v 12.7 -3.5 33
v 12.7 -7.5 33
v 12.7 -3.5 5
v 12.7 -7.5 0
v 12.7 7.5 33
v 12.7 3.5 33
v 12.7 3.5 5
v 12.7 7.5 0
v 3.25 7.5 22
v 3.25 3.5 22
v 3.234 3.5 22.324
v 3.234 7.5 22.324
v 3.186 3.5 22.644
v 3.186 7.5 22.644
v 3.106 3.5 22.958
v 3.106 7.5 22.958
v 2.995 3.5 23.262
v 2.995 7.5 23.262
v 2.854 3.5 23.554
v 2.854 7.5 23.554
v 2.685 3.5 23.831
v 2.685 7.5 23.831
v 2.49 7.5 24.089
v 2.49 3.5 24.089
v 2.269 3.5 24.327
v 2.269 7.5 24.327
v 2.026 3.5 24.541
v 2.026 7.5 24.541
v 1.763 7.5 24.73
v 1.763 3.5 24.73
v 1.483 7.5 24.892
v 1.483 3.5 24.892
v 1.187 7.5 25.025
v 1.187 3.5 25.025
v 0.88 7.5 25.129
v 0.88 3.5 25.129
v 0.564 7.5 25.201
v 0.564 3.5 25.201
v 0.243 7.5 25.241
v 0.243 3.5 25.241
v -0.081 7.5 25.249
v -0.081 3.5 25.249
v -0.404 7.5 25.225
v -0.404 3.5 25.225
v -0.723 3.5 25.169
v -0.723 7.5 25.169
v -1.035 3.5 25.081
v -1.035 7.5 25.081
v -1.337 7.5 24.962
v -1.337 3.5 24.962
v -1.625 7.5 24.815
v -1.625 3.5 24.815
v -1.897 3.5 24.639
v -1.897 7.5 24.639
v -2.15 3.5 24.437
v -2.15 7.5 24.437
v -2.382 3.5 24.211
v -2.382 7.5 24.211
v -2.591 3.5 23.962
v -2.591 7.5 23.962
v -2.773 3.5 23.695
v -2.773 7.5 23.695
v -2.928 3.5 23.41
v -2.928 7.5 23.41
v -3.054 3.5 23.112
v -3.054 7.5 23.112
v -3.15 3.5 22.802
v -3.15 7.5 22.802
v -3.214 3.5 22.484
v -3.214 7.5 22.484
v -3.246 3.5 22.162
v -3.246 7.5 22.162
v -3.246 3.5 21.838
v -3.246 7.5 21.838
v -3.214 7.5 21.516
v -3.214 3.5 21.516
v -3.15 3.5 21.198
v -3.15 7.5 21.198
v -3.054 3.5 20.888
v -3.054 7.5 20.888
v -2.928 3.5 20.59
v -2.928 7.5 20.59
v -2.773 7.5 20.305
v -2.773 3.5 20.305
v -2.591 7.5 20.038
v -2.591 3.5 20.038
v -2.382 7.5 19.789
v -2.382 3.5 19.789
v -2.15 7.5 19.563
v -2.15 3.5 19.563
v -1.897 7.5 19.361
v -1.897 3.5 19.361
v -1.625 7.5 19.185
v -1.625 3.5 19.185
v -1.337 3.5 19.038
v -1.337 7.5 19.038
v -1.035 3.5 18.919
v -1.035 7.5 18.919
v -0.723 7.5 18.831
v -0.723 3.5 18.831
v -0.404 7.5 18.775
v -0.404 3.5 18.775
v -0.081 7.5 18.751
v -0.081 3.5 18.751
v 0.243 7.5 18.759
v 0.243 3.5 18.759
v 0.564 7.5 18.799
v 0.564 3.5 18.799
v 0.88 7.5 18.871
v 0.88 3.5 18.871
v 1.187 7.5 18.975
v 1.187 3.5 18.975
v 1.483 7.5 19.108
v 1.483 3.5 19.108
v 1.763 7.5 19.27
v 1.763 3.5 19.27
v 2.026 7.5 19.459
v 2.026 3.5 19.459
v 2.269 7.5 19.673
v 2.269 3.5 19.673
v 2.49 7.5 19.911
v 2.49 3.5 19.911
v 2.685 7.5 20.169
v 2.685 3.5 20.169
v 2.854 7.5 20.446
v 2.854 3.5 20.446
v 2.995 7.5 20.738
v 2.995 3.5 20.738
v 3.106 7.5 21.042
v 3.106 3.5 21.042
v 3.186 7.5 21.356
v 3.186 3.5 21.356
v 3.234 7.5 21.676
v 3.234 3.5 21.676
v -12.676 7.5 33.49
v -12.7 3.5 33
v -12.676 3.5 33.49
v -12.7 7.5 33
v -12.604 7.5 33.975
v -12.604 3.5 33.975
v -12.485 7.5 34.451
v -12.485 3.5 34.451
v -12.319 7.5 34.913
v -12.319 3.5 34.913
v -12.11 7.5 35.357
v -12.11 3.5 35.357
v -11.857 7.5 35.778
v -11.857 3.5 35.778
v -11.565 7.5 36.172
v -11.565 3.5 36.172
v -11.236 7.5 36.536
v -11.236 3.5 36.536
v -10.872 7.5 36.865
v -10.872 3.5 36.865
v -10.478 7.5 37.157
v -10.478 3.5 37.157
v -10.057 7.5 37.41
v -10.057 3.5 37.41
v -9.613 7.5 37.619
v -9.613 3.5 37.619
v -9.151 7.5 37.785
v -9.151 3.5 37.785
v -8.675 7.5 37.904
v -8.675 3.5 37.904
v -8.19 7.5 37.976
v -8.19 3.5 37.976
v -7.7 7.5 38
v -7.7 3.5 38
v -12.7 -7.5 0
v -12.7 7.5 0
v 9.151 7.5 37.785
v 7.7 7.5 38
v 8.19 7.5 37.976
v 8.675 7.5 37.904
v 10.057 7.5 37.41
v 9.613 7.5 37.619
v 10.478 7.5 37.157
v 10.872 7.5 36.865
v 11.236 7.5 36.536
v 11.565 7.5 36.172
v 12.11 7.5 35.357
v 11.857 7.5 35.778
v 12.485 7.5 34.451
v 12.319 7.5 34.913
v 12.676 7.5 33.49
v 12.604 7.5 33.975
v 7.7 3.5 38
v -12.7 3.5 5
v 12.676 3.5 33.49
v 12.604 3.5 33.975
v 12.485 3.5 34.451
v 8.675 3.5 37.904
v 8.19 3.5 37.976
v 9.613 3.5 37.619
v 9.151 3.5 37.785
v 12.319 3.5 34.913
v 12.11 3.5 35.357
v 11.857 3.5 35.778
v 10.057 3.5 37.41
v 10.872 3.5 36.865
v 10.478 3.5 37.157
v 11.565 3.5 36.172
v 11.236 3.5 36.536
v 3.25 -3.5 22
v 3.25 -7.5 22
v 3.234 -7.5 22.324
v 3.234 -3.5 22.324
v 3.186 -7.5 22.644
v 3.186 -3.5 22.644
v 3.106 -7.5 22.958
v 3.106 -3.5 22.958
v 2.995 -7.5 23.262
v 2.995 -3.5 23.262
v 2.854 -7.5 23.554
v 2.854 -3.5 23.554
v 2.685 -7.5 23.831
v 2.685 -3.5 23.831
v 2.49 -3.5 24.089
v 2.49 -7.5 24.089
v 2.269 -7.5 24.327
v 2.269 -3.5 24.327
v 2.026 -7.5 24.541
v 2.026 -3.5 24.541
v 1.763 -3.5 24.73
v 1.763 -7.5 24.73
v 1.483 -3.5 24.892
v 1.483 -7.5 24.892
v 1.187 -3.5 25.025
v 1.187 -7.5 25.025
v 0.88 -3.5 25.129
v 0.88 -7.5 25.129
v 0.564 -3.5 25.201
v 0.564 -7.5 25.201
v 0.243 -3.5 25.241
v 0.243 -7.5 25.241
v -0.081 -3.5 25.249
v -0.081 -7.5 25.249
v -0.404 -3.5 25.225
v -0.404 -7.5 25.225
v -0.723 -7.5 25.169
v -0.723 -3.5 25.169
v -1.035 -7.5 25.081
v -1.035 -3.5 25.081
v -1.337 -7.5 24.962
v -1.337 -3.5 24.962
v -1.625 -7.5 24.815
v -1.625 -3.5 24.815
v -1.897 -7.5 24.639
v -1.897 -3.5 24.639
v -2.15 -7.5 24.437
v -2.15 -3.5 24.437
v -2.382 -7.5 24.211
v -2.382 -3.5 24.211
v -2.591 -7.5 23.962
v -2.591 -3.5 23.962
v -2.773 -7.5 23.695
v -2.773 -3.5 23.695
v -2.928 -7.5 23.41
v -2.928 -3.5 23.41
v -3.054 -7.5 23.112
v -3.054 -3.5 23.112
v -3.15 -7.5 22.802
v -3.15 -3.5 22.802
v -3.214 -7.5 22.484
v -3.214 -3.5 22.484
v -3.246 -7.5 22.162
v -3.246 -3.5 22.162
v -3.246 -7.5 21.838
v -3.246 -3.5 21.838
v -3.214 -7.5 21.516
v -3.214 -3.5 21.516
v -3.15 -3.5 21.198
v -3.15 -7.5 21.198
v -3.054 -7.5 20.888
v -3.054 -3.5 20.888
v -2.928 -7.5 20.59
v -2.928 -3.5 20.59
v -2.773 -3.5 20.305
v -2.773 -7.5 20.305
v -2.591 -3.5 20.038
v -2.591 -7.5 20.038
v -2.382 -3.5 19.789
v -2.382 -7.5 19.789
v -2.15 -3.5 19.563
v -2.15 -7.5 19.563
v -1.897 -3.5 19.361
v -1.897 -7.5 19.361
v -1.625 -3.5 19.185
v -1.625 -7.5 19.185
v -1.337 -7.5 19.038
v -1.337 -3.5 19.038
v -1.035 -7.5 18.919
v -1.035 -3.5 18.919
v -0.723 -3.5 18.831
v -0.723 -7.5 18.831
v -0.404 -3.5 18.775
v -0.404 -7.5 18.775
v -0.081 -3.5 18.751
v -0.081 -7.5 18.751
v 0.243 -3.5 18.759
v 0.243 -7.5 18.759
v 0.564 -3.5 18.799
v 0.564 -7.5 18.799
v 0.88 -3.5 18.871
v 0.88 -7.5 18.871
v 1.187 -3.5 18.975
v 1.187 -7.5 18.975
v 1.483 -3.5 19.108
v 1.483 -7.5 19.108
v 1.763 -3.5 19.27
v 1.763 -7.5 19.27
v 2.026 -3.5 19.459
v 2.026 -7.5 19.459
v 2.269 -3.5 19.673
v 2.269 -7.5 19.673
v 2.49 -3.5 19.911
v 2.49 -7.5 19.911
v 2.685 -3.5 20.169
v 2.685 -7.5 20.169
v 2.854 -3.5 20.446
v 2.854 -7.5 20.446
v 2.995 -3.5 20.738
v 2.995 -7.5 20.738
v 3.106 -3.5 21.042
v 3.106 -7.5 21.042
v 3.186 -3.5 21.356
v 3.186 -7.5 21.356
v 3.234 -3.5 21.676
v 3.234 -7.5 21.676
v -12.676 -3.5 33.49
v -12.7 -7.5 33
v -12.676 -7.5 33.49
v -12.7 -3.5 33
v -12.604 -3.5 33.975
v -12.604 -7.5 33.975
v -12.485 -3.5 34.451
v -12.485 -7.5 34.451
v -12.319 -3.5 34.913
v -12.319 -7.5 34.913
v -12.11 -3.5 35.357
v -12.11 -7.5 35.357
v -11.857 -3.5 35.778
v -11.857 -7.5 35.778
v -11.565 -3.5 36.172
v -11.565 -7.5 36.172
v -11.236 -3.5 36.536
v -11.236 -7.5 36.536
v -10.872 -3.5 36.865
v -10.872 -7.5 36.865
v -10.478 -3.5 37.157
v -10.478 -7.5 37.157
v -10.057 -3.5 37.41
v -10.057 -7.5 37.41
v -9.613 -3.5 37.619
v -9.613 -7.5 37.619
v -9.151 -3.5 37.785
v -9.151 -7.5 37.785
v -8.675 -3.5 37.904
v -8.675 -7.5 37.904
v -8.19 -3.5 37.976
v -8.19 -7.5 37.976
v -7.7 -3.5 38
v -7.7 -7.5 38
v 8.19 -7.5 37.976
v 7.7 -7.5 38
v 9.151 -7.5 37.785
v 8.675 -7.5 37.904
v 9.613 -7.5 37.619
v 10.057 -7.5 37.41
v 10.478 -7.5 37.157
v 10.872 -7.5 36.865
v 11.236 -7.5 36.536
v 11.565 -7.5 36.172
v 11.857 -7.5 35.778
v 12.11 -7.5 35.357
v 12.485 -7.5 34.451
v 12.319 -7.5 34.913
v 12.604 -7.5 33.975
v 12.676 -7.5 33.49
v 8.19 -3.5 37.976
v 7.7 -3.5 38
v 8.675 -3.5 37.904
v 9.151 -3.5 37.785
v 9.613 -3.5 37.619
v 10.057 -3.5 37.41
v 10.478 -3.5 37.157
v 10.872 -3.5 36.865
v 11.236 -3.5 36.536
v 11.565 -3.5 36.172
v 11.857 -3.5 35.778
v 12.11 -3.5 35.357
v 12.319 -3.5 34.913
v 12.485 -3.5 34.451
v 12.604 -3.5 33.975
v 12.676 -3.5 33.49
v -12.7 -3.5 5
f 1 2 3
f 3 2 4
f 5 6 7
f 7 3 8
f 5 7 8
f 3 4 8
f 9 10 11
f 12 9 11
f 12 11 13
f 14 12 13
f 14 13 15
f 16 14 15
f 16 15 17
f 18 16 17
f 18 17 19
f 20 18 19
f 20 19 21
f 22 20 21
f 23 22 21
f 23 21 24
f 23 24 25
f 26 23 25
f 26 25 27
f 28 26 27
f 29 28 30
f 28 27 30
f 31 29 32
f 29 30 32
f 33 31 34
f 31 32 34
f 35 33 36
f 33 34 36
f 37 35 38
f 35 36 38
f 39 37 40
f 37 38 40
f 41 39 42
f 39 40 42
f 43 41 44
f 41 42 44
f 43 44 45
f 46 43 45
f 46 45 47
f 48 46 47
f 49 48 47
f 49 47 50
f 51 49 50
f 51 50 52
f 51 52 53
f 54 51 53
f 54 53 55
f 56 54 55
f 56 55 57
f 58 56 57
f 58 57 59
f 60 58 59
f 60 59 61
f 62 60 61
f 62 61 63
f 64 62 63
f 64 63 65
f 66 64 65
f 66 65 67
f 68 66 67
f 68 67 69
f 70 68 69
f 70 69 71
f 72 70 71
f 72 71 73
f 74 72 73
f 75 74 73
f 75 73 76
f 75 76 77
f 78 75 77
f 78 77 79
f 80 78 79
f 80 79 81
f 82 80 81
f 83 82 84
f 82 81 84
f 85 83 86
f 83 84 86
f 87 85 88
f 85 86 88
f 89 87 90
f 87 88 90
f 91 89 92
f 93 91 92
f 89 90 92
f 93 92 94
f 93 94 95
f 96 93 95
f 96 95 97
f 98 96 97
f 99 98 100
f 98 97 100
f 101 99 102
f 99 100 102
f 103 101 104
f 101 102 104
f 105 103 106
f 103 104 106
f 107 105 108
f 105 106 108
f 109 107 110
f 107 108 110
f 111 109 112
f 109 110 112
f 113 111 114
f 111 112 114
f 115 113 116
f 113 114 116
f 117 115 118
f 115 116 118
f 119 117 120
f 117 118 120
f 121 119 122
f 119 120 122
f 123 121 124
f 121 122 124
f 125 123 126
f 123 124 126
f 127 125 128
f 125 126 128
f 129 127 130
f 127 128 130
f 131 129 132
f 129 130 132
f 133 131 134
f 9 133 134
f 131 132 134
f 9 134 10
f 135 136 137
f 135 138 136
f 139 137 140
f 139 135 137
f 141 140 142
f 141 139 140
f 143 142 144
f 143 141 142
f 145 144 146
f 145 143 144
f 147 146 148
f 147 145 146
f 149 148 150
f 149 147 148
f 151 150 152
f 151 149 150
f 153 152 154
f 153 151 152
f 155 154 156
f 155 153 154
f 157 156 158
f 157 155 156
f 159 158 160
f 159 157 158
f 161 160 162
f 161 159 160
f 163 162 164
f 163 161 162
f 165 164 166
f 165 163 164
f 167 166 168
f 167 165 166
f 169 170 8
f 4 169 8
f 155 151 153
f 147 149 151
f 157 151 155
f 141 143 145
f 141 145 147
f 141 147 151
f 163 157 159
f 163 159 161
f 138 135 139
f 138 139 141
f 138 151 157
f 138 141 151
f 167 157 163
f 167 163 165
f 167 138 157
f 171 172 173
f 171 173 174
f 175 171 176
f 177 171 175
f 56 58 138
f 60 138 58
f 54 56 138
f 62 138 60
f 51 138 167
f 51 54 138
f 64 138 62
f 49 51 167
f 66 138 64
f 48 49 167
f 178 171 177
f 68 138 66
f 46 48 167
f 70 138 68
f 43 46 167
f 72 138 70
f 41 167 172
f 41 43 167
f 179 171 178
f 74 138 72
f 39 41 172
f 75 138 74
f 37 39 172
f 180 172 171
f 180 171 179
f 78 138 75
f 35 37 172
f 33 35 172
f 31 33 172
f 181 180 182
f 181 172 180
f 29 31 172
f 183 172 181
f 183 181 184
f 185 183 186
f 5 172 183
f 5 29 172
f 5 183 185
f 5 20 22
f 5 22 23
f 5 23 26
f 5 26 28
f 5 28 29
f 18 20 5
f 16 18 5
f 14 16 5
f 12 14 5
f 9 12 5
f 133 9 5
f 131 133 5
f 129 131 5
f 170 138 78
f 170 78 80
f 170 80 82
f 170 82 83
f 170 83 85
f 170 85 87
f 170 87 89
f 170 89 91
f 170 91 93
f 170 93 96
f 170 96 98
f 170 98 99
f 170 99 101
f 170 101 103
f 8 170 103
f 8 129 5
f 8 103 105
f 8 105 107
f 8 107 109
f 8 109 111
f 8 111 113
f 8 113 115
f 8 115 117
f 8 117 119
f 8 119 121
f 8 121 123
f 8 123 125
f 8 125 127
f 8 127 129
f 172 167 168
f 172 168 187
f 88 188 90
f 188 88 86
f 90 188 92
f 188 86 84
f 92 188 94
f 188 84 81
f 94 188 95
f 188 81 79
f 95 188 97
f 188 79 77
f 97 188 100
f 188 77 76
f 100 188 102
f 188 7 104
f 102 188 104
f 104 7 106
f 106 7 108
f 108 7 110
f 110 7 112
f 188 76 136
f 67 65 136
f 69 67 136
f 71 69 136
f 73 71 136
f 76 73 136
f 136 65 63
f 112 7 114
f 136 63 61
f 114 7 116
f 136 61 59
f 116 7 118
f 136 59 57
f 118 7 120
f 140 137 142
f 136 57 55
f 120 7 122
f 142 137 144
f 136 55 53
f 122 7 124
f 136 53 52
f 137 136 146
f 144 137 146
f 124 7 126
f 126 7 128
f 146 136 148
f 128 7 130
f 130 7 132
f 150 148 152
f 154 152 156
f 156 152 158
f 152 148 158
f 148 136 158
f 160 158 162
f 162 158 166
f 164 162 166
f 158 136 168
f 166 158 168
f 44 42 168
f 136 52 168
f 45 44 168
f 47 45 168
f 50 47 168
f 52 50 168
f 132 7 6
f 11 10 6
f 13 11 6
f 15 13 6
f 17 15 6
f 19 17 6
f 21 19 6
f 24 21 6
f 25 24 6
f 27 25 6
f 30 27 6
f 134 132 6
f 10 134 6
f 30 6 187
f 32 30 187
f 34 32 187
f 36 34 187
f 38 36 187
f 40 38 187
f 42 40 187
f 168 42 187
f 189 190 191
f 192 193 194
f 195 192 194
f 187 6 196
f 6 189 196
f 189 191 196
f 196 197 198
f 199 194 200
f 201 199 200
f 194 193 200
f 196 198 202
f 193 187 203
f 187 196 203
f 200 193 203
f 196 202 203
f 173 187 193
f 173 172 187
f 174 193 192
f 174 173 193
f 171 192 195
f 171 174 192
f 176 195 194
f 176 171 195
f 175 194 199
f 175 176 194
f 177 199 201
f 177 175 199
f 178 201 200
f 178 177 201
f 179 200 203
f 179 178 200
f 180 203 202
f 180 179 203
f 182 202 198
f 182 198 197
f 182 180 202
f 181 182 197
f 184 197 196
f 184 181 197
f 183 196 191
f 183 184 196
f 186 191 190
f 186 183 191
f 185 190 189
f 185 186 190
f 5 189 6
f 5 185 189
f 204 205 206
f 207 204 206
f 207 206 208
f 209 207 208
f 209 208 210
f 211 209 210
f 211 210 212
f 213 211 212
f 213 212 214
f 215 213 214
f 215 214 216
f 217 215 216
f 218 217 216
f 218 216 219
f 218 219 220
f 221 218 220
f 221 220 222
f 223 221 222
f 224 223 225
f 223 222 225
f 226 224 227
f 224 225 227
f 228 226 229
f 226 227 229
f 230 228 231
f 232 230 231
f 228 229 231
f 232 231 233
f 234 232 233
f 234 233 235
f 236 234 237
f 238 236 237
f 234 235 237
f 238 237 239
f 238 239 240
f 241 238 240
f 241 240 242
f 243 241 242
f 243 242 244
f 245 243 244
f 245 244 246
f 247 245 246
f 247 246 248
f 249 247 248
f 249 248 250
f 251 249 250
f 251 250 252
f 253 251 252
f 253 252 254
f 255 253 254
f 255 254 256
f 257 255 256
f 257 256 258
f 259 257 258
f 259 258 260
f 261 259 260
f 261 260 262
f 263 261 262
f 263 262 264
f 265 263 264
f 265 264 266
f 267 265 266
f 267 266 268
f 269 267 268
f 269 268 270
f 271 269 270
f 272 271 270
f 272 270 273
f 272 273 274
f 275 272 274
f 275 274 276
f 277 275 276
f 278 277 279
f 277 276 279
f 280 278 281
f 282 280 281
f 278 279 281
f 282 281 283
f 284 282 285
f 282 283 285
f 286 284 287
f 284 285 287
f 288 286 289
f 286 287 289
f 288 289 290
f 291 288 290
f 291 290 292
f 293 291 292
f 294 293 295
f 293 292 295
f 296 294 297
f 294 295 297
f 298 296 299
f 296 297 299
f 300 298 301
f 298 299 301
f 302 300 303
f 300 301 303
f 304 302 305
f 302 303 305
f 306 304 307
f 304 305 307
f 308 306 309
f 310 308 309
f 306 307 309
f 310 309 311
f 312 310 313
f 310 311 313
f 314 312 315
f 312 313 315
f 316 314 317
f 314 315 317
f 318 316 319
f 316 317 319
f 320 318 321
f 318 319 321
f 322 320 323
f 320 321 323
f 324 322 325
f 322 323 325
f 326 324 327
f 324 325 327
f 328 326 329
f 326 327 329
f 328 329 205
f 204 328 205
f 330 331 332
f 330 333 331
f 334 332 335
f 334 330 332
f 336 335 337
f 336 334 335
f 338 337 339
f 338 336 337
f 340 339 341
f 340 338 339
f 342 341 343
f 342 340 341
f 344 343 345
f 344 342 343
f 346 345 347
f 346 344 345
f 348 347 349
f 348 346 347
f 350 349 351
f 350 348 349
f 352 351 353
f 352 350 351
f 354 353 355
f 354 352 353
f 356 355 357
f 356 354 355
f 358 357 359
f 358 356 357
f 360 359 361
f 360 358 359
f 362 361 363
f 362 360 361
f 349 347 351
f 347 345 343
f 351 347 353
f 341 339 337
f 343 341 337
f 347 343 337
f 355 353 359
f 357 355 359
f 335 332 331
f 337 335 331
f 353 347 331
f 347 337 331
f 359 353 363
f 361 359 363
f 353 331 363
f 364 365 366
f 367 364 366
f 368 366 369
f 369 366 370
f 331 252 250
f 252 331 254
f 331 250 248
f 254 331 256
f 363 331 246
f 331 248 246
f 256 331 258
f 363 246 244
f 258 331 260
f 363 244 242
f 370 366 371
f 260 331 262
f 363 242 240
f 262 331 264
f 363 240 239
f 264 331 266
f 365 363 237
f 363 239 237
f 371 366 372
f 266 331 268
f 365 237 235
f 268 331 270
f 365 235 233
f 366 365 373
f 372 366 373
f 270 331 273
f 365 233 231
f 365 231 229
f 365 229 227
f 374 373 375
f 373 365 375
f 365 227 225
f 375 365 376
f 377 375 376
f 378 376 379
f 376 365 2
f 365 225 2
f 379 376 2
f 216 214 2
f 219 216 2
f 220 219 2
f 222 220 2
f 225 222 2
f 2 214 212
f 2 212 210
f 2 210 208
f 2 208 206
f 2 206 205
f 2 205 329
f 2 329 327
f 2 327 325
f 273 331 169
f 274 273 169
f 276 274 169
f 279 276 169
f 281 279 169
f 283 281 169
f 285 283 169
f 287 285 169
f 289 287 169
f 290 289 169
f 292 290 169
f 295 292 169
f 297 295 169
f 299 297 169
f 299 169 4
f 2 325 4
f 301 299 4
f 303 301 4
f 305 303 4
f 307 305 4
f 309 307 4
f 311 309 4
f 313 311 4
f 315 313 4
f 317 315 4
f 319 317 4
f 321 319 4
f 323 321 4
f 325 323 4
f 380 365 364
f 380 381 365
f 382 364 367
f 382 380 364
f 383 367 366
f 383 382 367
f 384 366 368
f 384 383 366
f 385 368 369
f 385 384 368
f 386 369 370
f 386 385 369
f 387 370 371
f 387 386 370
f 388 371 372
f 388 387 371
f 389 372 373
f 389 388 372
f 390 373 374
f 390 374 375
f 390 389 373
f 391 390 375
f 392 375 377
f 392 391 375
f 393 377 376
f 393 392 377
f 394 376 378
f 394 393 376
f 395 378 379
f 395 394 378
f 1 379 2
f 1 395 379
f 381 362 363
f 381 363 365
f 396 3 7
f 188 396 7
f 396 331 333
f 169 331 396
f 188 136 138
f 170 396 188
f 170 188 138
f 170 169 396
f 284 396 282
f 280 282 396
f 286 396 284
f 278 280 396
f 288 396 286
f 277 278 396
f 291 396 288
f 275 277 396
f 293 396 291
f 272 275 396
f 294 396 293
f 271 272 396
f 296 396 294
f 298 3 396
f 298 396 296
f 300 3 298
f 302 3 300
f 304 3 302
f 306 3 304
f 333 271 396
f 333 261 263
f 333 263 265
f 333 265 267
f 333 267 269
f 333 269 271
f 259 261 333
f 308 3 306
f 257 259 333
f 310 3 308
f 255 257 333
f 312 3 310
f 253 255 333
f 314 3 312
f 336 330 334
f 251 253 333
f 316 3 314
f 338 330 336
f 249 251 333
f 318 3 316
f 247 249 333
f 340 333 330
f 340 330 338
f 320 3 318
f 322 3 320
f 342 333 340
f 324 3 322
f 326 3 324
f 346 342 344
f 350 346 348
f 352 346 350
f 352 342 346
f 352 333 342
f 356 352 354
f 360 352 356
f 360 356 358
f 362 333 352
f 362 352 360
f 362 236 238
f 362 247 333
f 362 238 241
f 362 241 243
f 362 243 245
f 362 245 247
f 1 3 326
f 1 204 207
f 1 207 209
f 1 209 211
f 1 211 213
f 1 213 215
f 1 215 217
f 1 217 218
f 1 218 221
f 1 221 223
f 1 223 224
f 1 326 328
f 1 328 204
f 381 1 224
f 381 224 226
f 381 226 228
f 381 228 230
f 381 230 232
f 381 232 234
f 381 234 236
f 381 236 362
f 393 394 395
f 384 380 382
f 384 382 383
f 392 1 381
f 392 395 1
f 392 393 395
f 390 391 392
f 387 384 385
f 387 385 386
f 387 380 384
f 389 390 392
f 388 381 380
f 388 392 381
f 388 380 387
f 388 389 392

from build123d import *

# Parameters (mm, degrees)
F0_W     = 25.4
F0_H     = 15
F1_DEPTH = 38
F2_W     = 7
F2_H     = 33
F3_DEPTH = 25.4
F4_R     = 5
F5_R     = 3.25
F6_DEPTH = 25


with BuildPart() as f1:
    # F0 (on Top) → F1 (new body)
    with BuildSketch(Plane.XY):
        Rectangle(F0_W, F0_H)
    extrude(amount=F1_DEPTH)

    # F2 (on face) → F3 (cut, through all)
    with BuildSketch(Plane.YZ.offset(12.7)):
        with Locations((0, 21.5)):
            Rectangle(F2_W, F2_H)
    extrude(amount=-F3_DEPTH, mode=Mode.SUBTRACT)

    # F4
    f4_edges = [f1.edges().sort_by_distance(p)[0] for p in [
        (12.7, 5.5, 38),
        (12.7, -5.5, 38),
        (-12.7, -5.5, 38),
        (-12.7, 5.5, 38),
    ]]
    fillet(f4_edges, radius=F4_R)

    # F5 (on face) → F6 (cut)
    with BuildSketch(Plane.XZ.offset(7.5)):
        with Locations((0, 22)):
            Circle(F5_R)
    extrude(amount=-F6_DEPTH, mode=Mode.SUBTRACT)


solid = f1.part
